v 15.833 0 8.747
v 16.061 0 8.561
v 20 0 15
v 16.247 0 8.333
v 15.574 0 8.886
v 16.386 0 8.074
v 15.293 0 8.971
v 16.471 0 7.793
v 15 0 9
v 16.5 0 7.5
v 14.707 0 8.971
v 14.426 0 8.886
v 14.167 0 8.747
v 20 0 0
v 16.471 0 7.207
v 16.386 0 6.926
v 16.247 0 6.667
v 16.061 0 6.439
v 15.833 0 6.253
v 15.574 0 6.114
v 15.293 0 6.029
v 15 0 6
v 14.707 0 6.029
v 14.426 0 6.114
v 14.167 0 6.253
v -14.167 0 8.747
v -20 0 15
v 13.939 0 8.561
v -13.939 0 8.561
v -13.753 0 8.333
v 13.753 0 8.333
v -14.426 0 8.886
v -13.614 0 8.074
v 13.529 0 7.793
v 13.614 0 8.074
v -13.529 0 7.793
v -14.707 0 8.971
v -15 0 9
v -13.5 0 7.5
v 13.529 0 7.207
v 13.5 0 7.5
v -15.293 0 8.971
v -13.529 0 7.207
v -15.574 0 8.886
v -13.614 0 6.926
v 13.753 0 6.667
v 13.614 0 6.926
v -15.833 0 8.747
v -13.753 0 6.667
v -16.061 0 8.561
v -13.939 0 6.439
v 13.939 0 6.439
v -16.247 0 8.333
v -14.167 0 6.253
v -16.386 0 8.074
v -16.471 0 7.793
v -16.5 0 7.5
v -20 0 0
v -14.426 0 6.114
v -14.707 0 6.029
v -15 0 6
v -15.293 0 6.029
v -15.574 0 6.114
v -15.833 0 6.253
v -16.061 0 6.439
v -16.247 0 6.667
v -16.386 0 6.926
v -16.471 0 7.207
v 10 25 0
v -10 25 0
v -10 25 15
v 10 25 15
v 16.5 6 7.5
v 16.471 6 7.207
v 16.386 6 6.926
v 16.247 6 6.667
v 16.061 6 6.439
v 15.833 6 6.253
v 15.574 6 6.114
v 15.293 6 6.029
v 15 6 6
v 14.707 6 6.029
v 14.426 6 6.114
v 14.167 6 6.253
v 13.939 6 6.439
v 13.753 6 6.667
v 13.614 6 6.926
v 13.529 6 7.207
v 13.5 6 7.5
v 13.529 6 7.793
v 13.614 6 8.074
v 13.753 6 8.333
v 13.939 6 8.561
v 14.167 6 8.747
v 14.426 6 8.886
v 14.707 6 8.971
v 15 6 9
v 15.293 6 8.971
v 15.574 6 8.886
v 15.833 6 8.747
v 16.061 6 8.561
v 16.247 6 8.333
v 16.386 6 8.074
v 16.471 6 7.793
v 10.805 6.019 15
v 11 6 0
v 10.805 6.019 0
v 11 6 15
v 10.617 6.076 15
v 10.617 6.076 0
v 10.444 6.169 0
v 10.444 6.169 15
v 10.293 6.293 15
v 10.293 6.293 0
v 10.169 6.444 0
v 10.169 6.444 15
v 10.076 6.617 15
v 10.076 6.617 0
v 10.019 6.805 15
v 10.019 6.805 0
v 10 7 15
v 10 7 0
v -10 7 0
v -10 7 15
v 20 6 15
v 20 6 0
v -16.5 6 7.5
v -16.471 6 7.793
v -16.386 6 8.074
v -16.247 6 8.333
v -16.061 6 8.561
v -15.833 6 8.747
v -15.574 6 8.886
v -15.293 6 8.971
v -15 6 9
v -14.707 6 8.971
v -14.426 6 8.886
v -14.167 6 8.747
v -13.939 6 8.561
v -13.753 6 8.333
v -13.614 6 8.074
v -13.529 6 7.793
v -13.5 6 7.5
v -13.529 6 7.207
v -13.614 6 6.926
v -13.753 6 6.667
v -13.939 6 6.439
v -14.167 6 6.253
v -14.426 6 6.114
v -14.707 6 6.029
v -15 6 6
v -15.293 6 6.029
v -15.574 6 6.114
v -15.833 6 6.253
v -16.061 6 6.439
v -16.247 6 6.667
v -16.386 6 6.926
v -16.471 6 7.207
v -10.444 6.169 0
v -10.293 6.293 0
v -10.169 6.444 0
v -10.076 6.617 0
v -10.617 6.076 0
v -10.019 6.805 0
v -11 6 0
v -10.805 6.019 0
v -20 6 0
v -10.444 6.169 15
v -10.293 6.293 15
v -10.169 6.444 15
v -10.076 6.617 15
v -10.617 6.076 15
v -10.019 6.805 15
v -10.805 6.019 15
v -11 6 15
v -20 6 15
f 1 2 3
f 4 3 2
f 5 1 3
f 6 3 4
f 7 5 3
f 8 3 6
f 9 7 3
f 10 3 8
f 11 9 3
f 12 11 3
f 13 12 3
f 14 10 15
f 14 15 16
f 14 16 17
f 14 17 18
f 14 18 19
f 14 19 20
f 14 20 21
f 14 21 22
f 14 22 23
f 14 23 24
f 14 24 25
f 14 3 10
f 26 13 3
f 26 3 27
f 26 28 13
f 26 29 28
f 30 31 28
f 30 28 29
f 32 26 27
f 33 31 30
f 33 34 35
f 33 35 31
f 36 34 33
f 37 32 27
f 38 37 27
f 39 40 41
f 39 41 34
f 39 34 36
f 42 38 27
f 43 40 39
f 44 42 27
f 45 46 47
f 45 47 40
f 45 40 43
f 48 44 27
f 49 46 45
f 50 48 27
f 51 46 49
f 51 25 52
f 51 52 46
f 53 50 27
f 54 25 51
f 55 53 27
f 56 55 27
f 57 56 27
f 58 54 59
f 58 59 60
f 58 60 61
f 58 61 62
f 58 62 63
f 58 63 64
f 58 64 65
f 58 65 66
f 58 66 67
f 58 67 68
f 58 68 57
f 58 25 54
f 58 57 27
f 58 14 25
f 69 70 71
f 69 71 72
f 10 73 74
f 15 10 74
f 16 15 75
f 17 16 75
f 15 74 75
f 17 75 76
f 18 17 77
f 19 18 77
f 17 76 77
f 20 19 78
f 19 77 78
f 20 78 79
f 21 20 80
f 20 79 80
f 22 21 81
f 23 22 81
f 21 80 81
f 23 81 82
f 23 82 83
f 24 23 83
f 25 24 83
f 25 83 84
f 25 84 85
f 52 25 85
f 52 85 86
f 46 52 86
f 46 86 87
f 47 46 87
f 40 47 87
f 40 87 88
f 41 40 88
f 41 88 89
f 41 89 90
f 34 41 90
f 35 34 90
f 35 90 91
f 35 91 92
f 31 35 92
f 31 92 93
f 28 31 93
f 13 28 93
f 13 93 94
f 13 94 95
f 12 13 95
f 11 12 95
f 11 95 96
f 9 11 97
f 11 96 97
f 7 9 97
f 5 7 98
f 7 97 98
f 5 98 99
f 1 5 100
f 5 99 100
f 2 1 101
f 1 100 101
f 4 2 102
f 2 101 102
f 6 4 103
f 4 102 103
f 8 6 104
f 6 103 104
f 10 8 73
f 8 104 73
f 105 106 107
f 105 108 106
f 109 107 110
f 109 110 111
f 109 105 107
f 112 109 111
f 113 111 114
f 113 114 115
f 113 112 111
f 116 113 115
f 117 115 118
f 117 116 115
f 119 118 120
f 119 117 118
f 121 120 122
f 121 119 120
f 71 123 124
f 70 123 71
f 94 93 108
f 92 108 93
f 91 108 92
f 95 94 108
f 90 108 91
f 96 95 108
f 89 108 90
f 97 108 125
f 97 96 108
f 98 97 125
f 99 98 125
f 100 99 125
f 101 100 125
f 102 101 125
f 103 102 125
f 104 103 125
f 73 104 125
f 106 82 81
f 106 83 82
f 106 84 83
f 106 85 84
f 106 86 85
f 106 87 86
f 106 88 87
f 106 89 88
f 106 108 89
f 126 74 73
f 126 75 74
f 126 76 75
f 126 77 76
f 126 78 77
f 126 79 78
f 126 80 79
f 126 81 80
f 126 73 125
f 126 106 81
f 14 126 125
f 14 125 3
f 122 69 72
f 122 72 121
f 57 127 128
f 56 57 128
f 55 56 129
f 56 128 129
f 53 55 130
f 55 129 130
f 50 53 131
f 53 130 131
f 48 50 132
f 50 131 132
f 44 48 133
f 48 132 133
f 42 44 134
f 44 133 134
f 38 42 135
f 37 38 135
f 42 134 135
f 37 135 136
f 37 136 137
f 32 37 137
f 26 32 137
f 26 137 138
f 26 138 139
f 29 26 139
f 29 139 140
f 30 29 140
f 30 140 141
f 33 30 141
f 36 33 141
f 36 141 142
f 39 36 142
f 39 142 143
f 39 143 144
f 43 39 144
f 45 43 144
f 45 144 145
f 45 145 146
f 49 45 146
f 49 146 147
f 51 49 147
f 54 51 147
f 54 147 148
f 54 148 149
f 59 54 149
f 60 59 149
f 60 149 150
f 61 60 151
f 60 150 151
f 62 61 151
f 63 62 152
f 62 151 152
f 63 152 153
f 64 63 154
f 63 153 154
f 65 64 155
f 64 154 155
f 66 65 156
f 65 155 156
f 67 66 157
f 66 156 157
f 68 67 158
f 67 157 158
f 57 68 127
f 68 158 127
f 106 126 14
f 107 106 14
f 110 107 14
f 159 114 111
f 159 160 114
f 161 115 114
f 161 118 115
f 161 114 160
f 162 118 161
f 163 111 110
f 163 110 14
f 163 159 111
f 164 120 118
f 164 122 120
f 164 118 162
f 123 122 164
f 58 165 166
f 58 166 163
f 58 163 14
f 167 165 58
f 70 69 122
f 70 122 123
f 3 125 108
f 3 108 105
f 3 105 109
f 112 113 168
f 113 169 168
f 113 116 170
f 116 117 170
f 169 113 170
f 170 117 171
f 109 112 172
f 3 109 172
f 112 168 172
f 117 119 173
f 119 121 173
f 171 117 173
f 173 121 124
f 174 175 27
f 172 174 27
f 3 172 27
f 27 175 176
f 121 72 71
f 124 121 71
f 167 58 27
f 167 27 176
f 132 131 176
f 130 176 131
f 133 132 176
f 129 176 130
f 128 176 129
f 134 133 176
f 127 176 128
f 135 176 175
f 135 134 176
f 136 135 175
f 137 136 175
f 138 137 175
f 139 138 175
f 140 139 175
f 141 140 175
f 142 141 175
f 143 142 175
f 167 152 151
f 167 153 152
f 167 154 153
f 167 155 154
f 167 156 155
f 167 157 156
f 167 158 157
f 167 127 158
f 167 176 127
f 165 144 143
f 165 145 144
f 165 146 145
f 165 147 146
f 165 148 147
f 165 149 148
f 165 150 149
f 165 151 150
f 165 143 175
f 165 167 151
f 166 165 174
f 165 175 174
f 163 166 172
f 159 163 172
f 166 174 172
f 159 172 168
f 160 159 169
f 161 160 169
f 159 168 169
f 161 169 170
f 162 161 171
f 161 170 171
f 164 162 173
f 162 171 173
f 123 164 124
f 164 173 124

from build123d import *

# Parameters (mm, degrees)
EXTRUDE_1_DEPTH     = 15
SKETCH_2_R          = 1.5
CUT_EXTRUDE_1_DEPTH = 32.400636936
FILLET_1_R          = 1


with BuildPart() as part:
    # 草图1 → 凸台-拉伸1 (new body)
    with BuildSketch(Plane.XY):
        Polygon((20, 0), (-20, 0), (-20, 6), (-10, 6), (-10, 25), (10, 25), (10, 6), (20, 6), align=None)
    extrude(amount=EXTRUDE_1_DEPTH)

    # 草图2 → 切除-拉伸1 (cut, through all)
    with BuildSketch(Plane(origin=(0, 6, 0), x_dir=(1, 0, 0), z_dir=(0, 1, 0))):
        with Locations(Location((-15, -7.5, 0), (0, 0, 180))):
            Circle(SKETCH_2_R)
        with Locations((15, -7.5)):
            Circle(SKETCH_2_R)
    extrude(amount=-CUT_EXTRUDE_1_DEPTH, mode=Mode.SUBTRACT)

    # 圆角1
    fillet_1_edges = [part.edges().sort_by_distance(p)[0] for p in [
        (-10, 6, 7.5),
        (10, 6, 7.5),
    ]]
    fillet(fillet_1_edges, radius=FILLET_1_R)


solid = part.part
